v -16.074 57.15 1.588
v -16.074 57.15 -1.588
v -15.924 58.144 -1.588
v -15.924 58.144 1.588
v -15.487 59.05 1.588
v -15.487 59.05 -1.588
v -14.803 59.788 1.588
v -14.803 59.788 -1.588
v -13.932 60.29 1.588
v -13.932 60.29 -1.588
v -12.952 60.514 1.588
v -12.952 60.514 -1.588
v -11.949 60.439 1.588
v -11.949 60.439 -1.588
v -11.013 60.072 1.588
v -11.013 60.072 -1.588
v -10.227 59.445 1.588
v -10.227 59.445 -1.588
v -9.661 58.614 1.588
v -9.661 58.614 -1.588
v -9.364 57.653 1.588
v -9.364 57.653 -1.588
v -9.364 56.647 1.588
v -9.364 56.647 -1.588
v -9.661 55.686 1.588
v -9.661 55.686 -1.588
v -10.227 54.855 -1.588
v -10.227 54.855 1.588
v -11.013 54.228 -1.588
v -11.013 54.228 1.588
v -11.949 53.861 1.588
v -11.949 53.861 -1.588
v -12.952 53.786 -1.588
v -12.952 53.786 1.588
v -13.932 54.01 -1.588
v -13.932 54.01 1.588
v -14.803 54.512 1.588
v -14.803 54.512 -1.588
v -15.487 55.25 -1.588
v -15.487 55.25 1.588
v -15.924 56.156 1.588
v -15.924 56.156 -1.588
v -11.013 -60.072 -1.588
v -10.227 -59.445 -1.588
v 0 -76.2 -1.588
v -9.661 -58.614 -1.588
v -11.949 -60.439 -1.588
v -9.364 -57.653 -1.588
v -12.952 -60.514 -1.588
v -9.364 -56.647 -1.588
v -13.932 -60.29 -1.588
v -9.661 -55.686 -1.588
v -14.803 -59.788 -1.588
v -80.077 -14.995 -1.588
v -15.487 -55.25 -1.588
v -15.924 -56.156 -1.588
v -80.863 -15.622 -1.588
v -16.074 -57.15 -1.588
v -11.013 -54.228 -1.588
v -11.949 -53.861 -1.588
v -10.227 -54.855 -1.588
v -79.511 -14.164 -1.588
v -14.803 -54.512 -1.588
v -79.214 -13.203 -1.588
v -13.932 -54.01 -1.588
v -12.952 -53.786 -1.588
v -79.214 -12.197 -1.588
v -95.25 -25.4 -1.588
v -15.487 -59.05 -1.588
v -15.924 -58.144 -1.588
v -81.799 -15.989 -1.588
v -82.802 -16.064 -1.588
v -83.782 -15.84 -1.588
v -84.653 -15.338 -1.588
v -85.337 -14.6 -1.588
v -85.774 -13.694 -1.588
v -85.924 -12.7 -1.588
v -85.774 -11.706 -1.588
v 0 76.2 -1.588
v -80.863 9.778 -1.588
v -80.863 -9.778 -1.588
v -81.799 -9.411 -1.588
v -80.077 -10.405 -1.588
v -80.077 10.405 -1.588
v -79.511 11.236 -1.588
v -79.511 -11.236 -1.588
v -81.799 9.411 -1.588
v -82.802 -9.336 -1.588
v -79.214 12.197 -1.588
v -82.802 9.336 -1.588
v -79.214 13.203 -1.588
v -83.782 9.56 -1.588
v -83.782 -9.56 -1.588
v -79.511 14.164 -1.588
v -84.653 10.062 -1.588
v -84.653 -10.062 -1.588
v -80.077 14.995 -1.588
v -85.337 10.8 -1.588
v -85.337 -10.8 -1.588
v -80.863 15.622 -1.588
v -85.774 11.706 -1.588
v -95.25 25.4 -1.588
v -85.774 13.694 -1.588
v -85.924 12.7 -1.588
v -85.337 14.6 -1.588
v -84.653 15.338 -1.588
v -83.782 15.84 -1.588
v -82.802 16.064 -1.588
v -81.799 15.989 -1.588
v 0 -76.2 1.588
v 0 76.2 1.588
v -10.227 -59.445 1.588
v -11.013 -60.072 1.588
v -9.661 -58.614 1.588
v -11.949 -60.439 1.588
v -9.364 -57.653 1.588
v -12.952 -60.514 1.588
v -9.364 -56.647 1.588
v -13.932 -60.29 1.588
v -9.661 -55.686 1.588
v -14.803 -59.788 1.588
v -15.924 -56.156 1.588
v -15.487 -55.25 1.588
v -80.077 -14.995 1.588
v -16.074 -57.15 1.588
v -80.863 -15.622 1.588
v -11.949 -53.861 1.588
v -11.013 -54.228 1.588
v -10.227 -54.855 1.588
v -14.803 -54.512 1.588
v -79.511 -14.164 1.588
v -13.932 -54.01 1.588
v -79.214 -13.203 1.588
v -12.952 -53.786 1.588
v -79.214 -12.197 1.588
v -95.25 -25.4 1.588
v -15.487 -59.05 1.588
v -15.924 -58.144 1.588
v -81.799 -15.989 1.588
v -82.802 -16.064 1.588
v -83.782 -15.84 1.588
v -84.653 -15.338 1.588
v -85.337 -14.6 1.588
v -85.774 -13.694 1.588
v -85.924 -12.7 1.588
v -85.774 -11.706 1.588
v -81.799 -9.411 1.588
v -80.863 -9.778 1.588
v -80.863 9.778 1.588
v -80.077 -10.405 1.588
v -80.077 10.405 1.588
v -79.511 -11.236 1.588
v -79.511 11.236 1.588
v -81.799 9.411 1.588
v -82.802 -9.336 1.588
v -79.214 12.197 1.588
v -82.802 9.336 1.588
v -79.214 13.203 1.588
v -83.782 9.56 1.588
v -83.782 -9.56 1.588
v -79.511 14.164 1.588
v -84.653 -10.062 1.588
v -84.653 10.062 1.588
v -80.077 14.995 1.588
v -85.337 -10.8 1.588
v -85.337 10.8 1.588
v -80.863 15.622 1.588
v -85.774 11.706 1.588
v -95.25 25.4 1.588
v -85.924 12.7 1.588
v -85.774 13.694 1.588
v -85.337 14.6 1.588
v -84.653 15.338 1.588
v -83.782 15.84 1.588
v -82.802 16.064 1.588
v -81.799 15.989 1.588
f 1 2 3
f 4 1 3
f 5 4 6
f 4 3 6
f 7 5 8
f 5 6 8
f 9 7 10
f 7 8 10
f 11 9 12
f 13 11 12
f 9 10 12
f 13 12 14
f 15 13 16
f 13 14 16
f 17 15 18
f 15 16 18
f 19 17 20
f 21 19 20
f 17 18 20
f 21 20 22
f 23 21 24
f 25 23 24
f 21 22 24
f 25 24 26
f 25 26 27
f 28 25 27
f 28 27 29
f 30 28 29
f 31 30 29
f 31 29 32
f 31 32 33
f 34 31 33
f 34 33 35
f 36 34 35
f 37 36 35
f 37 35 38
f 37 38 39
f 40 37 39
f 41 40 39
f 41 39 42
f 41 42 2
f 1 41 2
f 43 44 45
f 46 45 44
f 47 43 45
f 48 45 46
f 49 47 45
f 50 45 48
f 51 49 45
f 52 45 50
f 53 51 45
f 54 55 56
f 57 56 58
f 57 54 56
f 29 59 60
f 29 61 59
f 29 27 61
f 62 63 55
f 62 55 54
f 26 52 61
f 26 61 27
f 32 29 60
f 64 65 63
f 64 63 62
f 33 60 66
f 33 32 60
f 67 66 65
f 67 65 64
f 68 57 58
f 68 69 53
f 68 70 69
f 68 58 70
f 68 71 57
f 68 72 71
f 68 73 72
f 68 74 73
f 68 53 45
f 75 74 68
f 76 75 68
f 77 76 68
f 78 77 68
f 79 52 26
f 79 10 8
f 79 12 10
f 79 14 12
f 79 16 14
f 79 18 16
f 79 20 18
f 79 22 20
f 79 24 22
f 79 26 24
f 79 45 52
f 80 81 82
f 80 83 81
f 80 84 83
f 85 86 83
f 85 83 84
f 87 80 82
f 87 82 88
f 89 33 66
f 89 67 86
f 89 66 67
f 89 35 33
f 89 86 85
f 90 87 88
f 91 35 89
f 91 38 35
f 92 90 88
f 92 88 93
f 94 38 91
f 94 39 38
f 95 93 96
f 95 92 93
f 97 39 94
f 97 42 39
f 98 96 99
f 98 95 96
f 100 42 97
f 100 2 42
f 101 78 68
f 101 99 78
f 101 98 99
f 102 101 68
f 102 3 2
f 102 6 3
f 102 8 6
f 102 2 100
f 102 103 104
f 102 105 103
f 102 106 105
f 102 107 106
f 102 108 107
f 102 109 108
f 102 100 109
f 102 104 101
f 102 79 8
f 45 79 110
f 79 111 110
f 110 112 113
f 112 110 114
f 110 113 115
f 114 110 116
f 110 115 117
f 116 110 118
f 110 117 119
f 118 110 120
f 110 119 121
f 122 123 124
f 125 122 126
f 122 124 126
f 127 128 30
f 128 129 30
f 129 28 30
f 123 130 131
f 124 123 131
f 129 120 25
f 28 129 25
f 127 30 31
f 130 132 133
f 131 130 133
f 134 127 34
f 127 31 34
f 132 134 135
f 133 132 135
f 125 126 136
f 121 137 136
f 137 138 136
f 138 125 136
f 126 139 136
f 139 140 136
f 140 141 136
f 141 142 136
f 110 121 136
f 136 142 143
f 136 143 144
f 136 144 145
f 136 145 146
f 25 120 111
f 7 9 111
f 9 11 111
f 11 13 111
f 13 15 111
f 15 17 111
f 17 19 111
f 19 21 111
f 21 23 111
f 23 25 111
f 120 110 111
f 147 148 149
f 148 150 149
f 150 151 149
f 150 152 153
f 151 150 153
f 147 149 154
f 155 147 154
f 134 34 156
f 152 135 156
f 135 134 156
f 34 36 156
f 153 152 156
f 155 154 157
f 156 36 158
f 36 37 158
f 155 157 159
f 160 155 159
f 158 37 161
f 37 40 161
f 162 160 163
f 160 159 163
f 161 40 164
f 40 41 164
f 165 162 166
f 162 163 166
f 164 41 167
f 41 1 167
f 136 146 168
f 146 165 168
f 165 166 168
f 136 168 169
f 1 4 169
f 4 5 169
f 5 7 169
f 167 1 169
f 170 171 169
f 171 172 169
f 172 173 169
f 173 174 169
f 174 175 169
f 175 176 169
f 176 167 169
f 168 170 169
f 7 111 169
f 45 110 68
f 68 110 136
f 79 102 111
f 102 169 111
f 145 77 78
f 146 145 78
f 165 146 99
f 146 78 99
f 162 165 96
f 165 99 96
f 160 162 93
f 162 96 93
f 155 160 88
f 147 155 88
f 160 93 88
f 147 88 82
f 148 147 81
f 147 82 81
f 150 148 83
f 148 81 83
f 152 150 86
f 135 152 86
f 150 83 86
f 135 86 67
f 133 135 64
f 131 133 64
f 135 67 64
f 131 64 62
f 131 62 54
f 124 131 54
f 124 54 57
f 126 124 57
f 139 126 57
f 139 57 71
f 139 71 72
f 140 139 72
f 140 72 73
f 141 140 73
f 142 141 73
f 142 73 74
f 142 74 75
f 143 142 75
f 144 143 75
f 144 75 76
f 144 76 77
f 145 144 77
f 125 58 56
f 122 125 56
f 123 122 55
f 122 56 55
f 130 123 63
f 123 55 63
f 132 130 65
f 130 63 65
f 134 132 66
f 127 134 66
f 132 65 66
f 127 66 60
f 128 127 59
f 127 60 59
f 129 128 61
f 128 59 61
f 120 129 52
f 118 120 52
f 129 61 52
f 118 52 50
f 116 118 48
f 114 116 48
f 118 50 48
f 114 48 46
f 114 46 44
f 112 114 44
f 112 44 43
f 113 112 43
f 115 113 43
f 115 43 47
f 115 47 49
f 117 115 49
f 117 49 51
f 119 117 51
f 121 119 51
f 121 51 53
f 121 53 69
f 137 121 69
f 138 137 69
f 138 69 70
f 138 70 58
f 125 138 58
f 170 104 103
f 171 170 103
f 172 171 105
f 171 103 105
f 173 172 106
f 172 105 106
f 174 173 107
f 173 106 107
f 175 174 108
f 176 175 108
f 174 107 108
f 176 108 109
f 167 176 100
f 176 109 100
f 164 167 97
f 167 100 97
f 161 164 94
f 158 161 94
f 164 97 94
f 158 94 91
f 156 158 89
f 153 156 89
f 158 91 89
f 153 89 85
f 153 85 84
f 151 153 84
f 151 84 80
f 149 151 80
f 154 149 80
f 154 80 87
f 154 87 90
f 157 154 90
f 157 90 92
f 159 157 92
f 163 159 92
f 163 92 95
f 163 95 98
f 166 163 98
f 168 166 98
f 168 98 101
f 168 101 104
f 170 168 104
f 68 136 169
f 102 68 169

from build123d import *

# Parameters (mm, degrees)
BOSS_EXTRUDE3_DEPTH              = 1.5875
F_17_64_0_26563_DIAMETER_HOLE1_D = 6.747002


with BuildPart() as part:
    # Sketch2 → Boss-Extrude3 (new body, symmetric)
    with BuildSketch(Plane.XY):
        Polygon((-95.25, -25.4), (-95.25, 25.4), (0, 76.2), (0, -76.2), align=None)
    extrude(amount=BOSS_EXTRUDE3_DEPTH, both=True)

    # 17/64 (0.26563) Diameter Hole1 (through all)
    with Locations(Plane.XY.offset(1.5875)):
        with Locations((-82.55, 12.7), (-82.55, -12.7), (-12.7, -57.15), (-12.7, 57.15)):
            Hole(F_17_64_0_26563_DIAMETER_HOLE1_D / 2)


solid = part.part
